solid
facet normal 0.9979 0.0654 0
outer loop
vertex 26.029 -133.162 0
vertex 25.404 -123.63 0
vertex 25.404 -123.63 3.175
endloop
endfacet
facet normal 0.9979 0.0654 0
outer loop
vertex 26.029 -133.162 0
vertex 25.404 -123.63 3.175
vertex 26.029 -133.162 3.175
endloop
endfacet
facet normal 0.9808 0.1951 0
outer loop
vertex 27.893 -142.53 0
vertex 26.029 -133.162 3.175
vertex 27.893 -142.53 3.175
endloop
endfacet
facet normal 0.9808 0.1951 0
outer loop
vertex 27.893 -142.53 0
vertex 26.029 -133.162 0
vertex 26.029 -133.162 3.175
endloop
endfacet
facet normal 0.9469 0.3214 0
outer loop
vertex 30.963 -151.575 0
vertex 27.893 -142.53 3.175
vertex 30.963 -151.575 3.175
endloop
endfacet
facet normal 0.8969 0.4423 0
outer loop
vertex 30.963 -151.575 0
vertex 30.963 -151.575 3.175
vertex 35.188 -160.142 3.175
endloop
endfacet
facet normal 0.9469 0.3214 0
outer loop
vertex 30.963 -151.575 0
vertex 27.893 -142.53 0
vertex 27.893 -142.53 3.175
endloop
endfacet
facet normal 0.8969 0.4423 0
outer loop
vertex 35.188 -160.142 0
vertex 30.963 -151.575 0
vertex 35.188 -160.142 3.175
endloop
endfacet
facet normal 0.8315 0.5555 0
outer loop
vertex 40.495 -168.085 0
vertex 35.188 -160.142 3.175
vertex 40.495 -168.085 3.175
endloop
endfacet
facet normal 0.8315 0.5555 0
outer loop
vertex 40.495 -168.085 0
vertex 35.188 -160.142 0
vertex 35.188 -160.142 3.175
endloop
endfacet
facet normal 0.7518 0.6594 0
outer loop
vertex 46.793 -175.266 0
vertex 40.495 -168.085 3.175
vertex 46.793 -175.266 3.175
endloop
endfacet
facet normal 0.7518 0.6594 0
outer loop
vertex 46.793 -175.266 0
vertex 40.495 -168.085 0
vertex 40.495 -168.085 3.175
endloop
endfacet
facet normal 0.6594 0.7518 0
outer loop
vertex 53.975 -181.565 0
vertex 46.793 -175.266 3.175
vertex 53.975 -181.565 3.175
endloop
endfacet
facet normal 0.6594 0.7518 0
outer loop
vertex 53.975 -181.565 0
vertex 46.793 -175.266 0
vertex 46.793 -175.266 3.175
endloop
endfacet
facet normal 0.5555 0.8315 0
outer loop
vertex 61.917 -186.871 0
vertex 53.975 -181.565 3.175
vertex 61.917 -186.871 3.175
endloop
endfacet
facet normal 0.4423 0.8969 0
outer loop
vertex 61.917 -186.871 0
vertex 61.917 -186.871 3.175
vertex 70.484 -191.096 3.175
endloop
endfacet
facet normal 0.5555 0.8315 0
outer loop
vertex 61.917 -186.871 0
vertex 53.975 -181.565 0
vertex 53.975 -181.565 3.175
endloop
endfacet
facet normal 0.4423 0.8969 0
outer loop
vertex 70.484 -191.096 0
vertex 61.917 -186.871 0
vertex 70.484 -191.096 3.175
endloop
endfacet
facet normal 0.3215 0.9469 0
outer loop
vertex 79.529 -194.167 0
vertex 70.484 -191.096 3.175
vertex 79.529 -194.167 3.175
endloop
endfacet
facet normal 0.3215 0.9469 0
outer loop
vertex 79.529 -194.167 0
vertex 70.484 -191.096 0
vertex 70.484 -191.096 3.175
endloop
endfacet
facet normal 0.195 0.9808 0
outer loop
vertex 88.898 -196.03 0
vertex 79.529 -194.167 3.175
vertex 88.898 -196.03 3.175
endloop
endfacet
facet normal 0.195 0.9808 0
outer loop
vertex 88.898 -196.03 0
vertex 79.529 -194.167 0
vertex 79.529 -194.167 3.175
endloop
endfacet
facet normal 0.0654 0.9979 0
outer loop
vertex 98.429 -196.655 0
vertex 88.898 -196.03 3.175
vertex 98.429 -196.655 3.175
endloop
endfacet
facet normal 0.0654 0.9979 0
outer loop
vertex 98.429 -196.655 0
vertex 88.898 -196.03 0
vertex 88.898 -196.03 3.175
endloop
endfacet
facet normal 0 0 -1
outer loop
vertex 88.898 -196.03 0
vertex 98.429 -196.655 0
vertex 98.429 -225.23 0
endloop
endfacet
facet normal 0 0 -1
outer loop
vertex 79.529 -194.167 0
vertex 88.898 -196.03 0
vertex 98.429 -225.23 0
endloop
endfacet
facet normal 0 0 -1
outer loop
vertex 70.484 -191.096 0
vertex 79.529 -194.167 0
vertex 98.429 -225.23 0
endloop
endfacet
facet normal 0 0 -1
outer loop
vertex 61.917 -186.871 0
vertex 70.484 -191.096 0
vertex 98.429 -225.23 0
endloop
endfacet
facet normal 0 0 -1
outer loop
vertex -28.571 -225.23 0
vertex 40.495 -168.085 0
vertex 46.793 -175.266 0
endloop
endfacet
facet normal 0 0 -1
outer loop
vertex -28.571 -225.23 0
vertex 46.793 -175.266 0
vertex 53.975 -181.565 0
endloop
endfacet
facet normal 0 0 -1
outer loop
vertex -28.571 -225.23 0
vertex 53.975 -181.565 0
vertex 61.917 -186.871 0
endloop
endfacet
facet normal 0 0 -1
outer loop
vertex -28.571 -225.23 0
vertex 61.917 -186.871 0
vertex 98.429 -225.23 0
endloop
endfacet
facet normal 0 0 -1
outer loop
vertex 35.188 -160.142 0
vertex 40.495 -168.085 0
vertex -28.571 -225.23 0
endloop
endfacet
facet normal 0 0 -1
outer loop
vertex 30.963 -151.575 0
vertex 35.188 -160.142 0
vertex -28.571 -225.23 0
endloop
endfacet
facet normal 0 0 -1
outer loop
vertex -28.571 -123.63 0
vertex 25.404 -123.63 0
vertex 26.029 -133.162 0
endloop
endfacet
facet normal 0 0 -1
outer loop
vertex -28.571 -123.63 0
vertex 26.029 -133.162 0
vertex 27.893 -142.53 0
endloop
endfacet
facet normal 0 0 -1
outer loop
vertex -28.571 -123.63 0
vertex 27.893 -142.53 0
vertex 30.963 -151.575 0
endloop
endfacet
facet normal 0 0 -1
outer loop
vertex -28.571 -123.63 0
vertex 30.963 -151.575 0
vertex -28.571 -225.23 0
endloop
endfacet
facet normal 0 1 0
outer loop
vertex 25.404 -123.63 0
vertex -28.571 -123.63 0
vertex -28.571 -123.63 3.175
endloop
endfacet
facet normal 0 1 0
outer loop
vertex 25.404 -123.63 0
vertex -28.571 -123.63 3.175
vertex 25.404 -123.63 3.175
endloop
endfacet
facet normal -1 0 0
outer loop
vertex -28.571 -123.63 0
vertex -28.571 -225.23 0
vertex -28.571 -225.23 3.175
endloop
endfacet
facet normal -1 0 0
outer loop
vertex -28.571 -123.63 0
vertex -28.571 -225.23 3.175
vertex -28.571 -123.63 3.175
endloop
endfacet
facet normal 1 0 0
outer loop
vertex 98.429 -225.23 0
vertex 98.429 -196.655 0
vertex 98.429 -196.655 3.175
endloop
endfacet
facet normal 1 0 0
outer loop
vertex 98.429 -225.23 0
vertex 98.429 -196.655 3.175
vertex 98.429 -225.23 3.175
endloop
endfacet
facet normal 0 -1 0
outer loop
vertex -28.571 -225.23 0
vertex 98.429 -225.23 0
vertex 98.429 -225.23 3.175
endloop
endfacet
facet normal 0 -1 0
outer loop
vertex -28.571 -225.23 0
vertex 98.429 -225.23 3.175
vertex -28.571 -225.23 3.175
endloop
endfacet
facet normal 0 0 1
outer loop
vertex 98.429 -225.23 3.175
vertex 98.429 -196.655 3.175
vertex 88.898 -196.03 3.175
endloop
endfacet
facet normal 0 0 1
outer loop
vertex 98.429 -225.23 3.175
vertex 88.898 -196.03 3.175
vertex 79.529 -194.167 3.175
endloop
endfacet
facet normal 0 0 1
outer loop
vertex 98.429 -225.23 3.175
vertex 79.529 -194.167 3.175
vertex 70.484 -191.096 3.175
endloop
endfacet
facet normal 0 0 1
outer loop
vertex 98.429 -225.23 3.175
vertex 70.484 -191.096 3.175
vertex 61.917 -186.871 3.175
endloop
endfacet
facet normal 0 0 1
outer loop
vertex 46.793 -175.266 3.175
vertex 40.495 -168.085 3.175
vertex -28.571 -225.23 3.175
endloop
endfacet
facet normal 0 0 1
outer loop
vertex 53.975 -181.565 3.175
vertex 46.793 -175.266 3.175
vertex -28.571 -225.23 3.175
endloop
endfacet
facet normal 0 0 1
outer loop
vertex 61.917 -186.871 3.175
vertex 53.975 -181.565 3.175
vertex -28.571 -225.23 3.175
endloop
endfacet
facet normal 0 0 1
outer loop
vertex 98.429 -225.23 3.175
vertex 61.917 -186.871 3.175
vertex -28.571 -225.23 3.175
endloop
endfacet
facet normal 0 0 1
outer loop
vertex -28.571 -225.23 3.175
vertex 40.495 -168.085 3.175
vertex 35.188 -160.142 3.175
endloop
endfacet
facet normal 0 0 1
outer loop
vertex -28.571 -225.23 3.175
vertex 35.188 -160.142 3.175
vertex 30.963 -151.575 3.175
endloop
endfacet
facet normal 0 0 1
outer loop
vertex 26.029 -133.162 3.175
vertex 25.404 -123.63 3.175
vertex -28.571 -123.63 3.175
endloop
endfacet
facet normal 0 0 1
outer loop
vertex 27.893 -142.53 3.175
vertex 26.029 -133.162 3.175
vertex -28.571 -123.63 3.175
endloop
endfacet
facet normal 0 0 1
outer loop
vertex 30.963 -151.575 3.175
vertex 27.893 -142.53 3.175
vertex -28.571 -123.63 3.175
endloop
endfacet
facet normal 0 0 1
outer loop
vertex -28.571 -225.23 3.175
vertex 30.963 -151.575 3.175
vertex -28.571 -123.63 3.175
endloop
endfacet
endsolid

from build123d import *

# Parameters (mm, degrees)
BOSS_EXTRUDE1_DEPTH = 3.175


with BuildPart() as part:
    # Sketch1 → Boss-Extrude1 (new body)
    with BuildSketch(Plane.XY):
        with BuildLine():
            Line((98.429478474, -196.654958099), (98.429478474, -225.229958099))
            Line((98.429478474, -225.229958099), (-28.570521526, -225.229958099))
            Line((-28.570521526, -225.229958099), (-28.570521526, -123.629958099))
            Line((-28.570521526, -123.629958099), (25.404478474, -123.629958099))
            ThreePointArc((25.404478474, -123.629958099), (46.793005778, -175.266430795), (98.429478474, -196.654958099))
        make_face()
    extrude(amount=BOSS_EXTRUDE1_DEPTH)


solid = part.part
